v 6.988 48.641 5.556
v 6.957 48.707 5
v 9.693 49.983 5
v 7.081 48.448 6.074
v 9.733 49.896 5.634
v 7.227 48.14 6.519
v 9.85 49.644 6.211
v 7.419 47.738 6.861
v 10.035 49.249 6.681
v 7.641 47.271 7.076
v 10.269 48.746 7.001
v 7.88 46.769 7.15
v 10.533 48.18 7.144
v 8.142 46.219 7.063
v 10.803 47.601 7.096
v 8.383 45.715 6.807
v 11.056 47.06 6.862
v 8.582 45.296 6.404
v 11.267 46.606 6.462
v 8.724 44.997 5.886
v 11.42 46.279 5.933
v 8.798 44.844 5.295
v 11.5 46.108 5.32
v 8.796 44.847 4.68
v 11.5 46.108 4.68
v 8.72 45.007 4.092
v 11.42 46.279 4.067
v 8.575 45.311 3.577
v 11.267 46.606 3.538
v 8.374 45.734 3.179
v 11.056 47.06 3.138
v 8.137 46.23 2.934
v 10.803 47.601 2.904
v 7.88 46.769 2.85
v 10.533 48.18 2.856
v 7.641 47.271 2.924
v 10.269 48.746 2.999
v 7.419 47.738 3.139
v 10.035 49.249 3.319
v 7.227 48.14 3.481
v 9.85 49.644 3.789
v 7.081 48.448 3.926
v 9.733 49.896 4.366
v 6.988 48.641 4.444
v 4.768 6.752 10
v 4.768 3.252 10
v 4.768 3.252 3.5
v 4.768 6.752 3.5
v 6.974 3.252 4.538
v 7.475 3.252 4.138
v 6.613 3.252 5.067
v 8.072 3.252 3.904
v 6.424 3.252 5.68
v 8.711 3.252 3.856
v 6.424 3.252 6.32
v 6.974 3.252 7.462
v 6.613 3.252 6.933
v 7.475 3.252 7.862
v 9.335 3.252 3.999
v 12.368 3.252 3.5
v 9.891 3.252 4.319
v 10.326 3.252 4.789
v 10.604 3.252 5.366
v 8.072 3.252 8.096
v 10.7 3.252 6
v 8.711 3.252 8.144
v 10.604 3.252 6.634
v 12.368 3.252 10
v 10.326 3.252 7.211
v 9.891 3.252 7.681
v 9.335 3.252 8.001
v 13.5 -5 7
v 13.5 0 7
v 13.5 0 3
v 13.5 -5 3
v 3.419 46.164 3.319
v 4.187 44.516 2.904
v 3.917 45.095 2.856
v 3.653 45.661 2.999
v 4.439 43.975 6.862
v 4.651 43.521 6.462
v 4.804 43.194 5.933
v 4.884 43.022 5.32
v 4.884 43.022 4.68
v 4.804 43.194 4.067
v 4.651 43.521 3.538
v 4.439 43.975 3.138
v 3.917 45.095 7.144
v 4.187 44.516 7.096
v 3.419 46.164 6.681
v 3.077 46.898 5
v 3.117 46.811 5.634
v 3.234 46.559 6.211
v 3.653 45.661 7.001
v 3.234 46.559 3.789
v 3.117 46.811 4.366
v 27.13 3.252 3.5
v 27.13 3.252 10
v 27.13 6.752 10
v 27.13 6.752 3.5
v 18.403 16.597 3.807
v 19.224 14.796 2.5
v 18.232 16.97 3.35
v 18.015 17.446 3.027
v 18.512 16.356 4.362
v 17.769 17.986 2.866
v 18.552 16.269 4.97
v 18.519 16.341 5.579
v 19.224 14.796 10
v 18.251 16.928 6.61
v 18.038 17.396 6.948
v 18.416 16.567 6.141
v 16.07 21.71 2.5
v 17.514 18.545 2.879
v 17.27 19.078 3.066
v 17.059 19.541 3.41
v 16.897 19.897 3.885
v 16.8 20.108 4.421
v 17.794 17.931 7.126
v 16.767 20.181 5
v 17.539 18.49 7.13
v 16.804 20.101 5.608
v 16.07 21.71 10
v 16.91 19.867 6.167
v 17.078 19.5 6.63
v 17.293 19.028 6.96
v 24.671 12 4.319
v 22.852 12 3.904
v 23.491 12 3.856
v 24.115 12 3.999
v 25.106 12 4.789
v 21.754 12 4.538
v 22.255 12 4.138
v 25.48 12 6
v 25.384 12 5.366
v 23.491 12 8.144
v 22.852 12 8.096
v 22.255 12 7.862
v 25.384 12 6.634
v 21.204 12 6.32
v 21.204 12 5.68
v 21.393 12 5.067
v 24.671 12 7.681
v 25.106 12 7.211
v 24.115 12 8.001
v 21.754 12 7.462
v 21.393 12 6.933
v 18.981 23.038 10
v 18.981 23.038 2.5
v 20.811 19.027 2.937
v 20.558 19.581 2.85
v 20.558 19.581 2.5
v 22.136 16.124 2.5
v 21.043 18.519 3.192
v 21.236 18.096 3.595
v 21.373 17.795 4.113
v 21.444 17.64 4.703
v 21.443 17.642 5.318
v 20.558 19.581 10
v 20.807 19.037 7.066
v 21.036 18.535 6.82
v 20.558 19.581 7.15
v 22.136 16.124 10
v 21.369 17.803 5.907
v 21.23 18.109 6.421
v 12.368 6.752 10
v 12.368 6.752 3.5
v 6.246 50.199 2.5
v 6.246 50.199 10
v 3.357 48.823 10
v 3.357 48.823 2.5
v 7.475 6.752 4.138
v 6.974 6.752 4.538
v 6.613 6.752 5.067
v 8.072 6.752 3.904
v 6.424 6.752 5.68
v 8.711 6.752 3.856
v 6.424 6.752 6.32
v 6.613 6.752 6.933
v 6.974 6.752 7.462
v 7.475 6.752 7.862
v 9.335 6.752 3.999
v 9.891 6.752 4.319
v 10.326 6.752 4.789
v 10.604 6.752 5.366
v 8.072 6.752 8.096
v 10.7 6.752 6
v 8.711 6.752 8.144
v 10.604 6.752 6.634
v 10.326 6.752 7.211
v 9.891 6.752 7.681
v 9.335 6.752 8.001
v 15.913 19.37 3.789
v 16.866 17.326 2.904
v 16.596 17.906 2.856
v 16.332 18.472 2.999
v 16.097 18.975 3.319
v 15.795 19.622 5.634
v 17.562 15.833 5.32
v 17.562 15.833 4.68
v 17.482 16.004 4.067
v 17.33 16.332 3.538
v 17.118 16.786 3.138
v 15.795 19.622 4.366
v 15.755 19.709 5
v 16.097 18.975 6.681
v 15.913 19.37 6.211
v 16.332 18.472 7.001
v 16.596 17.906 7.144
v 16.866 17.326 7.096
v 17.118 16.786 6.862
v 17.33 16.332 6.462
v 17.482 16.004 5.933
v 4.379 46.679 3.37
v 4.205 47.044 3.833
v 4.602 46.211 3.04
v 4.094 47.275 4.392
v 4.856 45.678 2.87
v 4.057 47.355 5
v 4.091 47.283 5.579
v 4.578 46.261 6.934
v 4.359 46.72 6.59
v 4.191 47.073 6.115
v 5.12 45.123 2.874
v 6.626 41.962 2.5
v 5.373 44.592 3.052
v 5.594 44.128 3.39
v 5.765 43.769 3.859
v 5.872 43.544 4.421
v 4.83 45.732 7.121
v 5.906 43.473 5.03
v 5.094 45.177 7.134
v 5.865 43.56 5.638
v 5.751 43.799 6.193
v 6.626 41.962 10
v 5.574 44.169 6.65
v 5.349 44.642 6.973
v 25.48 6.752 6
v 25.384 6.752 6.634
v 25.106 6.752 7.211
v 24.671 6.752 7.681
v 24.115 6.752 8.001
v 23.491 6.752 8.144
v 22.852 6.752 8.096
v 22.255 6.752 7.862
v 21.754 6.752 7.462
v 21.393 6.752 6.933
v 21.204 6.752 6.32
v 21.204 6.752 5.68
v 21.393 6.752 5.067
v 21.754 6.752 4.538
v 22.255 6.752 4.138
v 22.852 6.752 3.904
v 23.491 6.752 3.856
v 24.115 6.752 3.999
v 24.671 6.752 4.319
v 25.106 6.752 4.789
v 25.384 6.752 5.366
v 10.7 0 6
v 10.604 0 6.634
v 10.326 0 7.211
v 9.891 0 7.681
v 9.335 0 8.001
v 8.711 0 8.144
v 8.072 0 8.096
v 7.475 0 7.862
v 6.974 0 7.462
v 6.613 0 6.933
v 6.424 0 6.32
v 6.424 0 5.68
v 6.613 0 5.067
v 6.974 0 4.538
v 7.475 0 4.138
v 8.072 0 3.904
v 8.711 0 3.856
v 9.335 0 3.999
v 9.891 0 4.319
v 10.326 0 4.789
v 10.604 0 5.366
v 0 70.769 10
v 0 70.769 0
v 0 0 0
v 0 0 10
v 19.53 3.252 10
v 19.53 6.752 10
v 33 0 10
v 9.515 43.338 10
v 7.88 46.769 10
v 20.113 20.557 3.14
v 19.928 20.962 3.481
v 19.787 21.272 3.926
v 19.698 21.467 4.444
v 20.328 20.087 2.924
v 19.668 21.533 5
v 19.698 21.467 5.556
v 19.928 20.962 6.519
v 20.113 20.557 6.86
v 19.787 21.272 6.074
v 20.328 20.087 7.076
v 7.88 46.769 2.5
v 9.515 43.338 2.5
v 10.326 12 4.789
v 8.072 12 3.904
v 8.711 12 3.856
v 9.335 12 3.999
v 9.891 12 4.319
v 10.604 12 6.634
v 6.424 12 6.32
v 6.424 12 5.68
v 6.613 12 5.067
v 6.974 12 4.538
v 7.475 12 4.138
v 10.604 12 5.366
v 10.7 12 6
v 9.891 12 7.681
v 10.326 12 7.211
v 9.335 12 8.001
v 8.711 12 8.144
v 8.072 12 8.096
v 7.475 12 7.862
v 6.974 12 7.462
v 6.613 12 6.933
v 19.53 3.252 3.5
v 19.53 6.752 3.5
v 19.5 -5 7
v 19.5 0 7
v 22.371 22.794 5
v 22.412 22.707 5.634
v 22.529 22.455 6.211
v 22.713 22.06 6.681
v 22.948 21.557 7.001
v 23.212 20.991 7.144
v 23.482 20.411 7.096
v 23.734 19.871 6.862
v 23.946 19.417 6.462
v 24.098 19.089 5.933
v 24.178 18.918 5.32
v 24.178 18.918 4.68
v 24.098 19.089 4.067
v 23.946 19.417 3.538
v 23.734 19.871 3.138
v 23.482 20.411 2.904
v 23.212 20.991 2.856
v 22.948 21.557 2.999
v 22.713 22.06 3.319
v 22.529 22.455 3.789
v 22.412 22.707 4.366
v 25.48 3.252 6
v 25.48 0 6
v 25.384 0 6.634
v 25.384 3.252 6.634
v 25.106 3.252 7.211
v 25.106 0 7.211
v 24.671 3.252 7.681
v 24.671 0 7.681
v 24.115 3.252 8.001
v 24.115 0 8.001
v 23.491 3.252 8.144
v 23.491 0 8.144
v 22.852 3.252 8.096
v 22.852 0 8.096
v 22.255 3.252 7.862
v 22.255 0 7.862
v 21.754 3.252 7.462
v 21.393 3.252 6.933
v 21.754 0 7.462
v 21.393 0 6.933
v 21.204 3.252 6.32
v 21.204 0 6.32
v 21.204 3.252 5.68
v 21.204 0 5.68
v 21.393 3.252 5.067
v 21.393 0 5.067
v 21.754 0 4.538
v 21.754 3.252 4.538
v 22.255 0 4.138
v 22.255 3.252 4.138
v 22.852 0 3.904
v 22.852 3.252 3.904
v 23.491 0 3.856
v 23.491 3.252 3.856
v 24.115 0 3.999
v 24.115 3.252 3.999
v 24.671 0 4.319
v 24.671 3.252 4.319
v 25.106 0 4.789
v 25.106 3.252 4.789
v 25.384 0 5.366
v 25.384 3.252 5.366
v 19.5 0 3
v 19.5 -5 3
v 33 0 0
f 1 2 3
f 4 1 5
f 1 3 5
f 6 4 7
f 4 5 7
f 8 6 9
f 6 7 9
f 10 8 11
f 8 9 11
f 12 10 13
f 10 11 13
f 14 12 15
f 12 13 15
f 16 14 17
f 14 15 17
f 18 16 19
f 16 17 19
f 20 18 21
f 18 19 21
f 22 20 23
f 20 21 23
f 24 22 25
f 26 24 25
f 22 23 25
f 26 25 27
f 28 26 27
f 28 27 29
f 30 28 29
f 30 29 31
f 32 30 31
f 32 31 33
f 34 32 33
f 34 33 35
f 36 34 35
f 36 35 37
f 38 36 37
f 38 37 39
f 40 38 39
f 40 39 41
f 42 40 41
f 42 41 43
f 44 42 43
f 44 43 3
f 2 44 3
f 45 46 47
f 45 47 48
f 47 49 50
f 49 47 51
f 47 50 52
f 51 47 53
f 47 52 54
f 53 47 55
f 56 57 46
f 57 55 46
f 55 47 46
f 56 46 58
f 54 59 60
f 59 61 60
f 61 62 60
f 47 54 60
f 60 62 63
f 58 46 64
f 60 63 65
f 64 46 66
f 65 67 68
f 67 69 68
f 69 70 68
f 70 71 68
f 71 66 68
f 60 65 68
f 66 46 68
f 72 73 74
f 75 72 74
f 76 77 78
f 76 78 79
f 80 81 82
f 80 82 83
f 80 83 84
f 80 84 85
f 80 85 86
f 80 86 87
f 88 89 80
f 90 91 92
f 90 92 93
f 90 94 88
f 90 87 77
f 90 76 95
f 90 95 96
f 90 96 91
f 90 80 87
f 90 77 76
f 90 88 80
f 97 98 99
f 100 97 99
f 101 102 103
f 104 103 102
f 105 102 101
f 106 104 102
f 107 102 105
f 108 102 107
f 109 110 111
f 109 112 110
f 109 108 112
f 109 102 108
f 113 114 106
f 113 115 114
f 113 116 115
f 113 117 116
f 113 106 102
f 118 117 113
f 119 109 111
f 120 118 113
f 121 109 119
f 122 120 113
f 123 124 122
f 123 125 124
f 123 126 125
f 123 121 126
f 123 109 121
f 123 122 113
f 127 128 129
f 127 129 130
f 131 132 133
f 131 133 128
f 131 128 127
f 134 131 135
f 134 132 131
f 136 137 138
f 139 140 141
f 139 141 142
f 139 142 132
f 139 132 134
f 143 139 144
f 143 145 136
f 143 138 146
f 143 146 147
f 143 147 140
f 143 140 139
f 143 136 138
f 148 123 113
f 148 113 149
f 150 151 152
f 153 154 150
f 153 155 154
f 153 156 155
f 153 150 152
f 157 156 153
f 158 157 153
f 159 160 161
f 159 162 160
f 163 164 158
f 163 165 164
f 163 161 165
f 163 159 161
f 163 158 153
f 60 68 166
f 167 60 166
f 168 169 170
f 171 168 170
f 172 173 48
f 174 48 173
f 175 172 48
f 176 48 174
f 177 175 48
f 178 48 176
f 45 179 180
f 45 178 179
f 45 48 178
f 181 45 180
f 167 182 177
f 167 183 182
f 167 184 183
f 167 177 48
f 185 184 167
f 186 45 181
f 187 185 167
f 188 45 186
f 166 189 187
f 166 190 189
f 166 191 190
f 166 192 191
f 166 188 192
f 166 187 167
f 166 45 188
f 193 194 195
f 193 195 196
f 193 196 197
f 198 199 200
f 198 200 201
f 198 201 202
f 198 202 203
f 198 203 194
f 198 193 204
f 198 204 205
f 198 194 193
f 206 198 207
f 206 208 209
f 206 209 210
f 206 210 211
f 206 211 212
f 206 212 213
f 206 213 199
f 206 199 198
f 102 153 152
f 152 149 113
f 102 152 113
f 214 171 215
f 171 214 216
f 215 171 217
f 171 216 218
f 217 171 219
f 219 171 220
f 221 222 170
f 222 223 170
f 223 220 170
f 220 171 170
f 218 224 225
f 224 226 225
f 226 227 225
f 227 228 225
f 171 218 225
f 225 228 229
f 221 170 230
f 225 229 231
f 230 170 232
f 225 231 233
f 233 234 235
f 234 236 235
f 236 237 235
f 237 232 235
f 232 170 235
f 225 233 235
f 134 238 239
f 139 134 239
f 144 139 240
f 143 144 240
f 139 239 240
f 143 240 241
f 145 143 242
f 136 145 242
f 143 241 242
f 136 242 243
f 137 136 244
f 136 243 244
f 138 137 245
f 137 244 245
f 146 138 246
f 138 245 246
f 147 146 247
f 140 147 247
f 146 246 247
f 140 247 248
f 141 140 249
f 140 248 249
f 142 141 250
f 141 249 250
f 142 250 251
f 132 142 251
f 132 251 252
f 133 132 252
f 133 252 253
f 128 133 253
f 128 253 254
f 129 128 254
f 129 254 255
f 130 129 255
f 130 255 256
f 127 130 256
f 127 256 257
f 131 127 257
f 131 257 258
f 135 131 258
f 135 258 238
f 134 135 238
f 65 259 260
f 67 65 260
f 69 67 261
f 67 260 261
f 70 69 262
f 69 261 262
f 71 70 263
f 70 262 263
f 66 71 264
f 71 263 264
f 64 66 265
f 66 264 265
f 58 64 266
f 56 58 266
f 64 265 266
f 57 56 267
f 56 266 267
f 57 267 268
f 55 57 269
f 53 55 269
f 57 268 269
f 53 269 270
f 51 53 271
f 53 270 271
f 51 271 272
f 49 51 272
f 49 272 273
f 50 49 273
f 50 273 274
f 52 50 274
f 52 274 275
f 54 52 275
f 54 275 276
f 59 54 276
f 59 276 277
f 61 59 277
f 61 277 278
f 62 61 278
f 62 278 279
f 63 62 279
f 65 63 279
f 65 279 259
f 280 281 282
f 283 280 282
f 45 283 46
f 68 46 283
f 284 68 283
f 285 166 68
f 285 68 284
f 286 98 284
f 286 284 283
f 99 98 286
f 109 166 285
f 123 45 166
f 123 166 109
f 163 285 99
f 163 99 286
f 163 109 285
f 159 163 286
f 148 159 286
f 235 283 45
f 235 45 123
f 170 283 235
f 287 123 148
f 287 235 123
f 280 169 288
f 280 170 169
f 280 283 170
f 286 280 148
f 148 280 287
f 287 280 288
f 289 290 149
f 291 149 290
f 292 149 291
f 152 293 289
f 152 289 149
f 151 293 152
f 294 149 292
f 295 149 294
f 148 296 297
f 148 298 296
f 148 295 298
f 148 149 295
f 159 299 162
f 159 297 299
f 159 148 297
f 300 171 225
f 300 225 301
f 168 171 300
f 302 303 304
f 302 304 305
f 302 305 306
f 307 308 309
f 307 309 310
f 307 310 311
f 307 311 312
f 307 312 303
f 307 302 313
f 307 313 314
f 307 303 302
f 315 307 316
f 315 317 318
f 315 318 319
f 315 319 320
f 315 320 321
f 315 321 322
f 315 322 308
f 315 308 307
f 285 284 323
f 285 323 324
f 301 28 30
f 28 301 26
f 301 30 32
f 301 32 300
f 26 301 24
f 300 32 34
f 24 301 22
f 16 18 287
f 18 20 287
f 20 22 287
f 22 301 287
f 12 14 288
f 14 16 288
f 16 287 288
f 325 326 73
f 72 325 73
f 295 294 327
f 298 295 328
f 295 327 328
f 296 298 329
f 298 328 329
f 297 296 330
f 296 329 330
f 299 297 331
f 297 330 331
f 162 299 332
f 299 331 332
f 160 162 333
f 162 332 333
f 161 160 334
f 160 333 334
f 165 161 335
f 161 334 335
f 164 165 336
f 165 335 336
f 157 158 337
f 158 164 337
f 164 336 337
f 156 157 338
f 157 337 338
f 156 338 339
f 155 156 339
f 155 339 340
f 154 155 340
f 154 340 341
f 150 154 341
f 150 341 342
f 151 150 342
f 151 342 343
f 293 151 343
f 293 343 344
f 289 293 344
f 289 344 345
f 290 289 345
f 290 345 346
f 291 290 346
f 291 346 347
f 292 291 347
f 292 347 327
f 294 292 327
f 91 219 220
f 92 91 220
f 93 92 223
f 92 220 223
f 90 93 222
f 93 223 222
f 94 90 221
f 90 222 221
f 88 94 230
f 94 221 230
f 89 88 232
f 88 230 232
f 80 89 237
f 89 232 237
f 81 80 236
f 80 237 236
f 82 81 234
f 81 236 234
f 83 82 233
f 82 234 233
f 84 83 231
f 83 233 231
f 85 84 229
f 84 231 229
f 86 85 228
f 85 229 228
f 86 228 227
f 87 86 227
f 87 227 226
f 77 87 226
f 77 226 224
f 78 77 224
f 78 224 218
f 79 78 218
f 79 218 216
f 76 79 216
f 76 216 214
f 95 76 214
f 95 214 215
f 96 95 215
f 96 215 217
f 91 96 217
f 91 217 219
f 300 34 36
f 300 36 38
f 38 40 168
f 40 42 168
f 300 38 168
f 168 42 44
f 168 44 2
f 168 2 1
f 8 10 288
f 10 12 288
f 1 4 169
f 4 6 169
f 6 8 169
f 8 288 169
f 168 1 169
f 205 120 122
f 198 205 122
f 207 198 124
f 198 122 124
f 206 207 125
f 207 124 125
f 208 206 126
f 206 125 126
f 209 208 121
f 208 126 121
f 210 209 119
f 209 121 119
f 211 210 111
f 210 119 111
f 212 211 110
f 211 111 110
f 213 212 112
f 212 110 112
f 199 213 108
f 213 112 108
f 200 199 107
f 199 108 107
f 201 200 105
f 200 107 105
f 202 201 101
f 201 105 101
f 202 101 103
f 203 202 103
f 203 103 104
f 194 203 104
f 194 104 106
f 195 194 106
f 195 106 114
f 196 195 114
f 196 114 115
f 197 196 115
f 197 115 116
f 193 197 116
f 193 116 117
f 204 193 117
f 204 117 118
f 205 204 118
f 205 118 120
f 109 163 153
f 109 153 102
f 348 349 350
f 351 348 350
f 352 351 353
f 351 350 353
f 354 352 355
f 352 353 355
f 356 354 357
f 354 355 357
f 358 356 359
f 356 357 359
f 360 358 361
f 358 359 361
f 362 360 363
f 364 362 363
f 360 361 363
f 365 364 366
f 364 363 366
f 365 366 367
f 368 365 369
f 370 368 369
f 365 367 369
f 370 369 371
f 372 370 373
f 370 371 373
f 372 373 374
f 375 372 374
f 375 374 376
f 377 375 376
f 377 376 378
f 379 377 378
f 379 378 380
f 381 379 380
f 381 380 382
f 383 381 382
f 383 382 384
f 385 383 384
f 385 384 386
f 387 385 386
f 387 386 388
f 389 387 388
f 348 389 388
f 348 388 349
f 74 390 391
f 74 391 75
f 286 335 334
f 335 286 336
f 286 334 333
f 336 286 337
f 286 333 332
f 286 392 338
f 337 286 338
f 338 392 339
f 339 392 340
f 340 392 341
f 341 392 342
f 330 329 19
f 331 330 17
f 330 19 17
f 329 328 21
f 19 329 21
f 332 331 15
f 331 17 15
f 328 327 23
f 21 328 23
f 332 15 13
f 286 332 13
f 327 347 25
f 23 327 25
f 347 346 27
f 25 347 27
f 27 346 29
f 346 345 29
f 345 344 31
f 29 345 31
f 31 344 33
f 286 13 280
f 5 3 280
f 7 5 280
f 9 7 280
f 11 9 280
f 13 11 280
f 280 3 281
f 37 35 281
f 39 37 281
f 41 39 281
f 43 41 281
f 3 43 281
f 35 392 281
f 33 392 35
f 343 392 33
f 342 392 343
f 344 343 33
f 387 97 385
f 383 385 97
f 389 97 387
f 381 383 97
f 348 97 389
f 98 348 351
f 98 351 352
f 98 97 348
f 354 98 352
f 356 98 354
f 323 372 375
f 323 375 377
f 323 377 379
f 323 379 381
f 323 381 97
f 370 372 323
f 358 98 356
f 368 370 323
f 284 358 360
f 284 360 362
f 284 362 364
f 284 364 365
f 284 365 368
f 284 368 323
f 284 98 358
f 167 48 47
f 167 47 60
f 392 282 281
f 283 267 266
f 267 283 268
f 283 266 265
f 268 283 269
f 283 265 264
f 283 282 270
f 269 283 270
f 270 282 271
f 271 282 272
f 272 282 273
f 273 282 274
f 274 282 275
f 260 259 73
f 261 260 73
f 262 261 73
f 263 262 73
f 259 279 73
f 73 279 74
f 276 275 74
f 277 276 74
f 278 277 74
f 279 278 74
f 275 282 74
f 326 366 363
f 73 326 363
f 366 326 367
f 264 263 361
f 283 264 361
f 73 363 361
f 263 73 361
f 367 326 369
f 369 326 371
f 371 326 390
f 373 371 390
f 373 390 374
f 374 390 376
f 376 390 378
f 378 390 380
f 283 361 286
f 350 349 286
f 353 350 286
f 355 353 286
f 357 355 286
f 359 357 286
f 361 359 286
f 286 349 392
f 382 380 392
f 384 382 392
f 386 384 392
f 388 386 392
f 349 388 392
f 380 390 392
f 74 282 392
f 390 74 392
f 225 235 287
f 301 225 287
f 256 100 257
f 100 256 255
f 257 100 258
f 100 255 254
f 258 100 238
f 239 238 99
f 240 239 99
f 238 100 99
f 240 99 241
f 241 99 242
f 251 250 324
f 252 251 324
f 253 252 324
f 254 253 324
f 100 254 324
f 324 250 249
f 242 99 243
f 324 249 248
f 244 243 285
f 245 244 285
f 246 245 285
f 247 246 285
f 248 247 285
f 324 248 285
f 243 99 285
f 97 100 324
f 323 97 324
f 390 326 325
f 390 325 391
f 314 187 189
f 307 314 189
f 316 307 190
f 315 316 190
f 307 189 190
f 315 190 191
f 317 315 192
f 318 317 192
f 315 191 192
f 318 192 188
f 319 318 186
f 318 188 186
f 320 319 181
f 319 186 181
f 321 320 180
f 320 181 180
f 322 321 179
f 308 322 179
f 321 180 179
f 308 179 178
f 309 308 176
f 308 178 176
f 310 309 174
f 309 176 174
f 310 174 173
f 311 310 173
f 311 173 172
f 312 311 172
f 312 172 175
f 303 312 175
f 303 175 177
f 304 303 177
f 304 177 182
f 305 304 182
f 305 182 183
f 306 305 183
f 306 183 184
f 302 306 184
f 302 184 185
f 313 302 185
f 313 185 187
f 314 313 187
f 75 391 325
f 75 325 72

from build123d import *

# Parameters (mm, degrees)
BOSS_EXTRUDE1_DEPTH = 10
SKETCH2_W           = 6
SKETCH2_H           = 4
BOSS_EXTRUDE2_DEPTH = 5
SKETCH3_R           = 2.15
CUT_EXTRUDE1_DEPTH  = 12
SKETCH6_R           = 2.15
CUT_EXTRUDE4_DEPTH  = 7.3
CUT_EXTRUDE5_START  = -10
SKETCH4_W           = 7.6
SKETCH4_H           = 3.5
CUT_EXTRUDE5_DEPTH  = 6.5
SKETCH7_W           = 7.6
SKETCH7_H           = 3.5
CUT_EXTRUDE6_DEPTH  = 6.5
CUT_EXTRUDE7_DEPTH  = 7.5


with BuildPart() as part:
    # Sketch1 → Boss-Extrude1 (new body)
    with BuildSketch(Plane.XY):
        Polygon((0, 70.768728377), (0, 0), (33, 0), align=None)
    extrude(amount=BOSS_EXTRUDE1_DEPTH)

    # Sketch2 → Boss-Extrude2 (add)
    with BuildSketch(Plane(origin=(0, 0, 0), x_dir=(-1, 0, 0), z_dir=(0, -1, 0))):
        with Locations((-16.5, -5)):
            Rectangle(SKETCH2_W, SKETCH2_H)
    extrude(amount=BOSS_EXTRUDE2_DEPTH)

    # Sketch3 → Cut-Extrude1 (cut)
    with BuildSketch(Plane(origin=(0, 0, 0), x_dir=(-1, 0, 0), z_dir=(0, -1, 0))):
        with Locations(Location((-23.33, -6, 0), (0, 0, 180))):
            Circle(SKETCH3_R)
        with Locations(Location((-8.55, -6, 0), (0, 0, 180))):
            Circle(SKETCH3_R)
    extrude(amount=-CUT_EXTRUDE1_DEPTH, mode=Mode.SUBTRACT)

    # Sketch6 → Cut-Extrude4 (cut)
    with BuildSketch(Plane(origin=(27.10599556, 12.639733311, 0), x_dir=(0, 0, -1), z_dir=(0.9063077870366479, 0.422618261740704, 0))):
        with Locations(Location((-5, 9.053597363, 0), (0, 0, 90))):
            Circle(SKETCH6_R)
        with Locations(Location((-5, 39.053597363, 0), (0, 0, 90))):
            Circle(SKETCH6_R)
    extrude(amount=-CUT_EXTRUDE4_DEPTH, mode=Mode.SUBTRACT)

    # Sketch4 → Cut-Extrude5 (cut)
    with BuildSketch(Plane(origin=(0, 0, 0), x_dir=(-1, 0, 0), z_dir=(0, 0, -1)).offset(CUT_EXTRUDE5_START)):
        with Locations((-23.33, 5.001728642)):
            Rectangle(SKETCH4_W, SKETCH4_H)
    extrude(amount=CUT_EXTRUDE5_DEPTH, mode=Mode.SUBTRACT)

    # Sketch7 → Cut-Extrude6 (cut)
    with BuildSketch(Plane.XY.offset(10)):
        with Locations((8.567911565, 5.001728642)):
            Rectangle(SKETCH7_W, SKETCH7_H)
    extrude(amount=-CUT_EXTRUDE6_DEPTH, mode=Mode.SUBTRACT)

    # Sketch9 → Cut-Extrude7 (cut)
    with BuildSketch(Plane.XY.offset(10)):
        Polygon((7.880441317, 46.768813524), (6.246018546, 50.199361906), (3.357135698, 48.823005888), (6.625981241, 41.961909123), (9.514864089, 43.338265141), align=None)
        Polygon((18.980916312, 23.03825064), (20.55828213, 19.581096164), (22.135647949, 16.123941687), (19.224359969, 14.795633629), (16.069628331, 21.709942582), align=None)
    extrude(amount=-CUT_EXTRUDE7_DEPTH, mode=Mode.SUBTRACT)


solid = part.part
